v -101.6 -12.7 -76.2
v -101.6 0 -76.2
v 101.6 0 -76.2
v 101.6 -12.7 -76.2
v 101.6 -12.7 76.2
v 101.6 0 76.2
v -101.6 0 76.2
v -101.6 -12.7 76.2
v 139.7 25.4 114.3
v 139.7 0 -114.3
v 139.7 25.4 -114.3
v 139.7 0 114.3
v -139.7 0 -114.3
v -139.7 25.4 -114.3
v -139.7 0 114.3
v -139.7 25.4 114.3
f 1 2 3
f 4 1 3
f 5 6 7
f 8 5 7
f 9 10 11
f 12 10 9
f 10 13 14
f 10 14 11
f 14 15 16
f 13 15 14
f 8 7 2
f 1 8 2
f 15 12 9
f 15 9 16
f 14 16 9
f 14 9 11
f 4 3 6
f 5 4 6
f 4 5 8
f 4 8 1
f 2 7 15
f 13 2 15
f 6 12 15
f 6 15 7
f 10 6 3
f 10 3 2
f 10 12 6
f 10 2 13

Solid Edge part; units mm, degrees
sketch "Sketch1" plane through (0, 0, 0) normal (0, -1, 0) x (1, 0, 0)
  line L0 (139.7, 114.3) -> (-139.7, 114.3)
  line L1 (-139.7, 114.3) -> (-139.7, -114.3)
  line L2 (-139.7, -114.3) -> (139.7, -114.3)
  line L3 (139.7, -114.3) -> (139.7, 114.3)
extrude "Protrusion1" add sketch "Sketch1" against normal blind 25.4
sketch "Sketch2" plane through (0, 0, 0) normal (0, -1, 0) x (1, 0, 0)
  line L0 (101.6, 76.2) -> (-101.6, 76.2)
  line L1 (-101.6, 76.2) -> (-101.6, -76.2)
  line L2 (-101.6, -76.2) -> (101.6, -76.2)
  line L3 (101.6, -76.2) -> (101.6, 76.2)
extrude "ExtrudedProtrusion_2" add sketch "Sketch2" along normal blind 12.7
